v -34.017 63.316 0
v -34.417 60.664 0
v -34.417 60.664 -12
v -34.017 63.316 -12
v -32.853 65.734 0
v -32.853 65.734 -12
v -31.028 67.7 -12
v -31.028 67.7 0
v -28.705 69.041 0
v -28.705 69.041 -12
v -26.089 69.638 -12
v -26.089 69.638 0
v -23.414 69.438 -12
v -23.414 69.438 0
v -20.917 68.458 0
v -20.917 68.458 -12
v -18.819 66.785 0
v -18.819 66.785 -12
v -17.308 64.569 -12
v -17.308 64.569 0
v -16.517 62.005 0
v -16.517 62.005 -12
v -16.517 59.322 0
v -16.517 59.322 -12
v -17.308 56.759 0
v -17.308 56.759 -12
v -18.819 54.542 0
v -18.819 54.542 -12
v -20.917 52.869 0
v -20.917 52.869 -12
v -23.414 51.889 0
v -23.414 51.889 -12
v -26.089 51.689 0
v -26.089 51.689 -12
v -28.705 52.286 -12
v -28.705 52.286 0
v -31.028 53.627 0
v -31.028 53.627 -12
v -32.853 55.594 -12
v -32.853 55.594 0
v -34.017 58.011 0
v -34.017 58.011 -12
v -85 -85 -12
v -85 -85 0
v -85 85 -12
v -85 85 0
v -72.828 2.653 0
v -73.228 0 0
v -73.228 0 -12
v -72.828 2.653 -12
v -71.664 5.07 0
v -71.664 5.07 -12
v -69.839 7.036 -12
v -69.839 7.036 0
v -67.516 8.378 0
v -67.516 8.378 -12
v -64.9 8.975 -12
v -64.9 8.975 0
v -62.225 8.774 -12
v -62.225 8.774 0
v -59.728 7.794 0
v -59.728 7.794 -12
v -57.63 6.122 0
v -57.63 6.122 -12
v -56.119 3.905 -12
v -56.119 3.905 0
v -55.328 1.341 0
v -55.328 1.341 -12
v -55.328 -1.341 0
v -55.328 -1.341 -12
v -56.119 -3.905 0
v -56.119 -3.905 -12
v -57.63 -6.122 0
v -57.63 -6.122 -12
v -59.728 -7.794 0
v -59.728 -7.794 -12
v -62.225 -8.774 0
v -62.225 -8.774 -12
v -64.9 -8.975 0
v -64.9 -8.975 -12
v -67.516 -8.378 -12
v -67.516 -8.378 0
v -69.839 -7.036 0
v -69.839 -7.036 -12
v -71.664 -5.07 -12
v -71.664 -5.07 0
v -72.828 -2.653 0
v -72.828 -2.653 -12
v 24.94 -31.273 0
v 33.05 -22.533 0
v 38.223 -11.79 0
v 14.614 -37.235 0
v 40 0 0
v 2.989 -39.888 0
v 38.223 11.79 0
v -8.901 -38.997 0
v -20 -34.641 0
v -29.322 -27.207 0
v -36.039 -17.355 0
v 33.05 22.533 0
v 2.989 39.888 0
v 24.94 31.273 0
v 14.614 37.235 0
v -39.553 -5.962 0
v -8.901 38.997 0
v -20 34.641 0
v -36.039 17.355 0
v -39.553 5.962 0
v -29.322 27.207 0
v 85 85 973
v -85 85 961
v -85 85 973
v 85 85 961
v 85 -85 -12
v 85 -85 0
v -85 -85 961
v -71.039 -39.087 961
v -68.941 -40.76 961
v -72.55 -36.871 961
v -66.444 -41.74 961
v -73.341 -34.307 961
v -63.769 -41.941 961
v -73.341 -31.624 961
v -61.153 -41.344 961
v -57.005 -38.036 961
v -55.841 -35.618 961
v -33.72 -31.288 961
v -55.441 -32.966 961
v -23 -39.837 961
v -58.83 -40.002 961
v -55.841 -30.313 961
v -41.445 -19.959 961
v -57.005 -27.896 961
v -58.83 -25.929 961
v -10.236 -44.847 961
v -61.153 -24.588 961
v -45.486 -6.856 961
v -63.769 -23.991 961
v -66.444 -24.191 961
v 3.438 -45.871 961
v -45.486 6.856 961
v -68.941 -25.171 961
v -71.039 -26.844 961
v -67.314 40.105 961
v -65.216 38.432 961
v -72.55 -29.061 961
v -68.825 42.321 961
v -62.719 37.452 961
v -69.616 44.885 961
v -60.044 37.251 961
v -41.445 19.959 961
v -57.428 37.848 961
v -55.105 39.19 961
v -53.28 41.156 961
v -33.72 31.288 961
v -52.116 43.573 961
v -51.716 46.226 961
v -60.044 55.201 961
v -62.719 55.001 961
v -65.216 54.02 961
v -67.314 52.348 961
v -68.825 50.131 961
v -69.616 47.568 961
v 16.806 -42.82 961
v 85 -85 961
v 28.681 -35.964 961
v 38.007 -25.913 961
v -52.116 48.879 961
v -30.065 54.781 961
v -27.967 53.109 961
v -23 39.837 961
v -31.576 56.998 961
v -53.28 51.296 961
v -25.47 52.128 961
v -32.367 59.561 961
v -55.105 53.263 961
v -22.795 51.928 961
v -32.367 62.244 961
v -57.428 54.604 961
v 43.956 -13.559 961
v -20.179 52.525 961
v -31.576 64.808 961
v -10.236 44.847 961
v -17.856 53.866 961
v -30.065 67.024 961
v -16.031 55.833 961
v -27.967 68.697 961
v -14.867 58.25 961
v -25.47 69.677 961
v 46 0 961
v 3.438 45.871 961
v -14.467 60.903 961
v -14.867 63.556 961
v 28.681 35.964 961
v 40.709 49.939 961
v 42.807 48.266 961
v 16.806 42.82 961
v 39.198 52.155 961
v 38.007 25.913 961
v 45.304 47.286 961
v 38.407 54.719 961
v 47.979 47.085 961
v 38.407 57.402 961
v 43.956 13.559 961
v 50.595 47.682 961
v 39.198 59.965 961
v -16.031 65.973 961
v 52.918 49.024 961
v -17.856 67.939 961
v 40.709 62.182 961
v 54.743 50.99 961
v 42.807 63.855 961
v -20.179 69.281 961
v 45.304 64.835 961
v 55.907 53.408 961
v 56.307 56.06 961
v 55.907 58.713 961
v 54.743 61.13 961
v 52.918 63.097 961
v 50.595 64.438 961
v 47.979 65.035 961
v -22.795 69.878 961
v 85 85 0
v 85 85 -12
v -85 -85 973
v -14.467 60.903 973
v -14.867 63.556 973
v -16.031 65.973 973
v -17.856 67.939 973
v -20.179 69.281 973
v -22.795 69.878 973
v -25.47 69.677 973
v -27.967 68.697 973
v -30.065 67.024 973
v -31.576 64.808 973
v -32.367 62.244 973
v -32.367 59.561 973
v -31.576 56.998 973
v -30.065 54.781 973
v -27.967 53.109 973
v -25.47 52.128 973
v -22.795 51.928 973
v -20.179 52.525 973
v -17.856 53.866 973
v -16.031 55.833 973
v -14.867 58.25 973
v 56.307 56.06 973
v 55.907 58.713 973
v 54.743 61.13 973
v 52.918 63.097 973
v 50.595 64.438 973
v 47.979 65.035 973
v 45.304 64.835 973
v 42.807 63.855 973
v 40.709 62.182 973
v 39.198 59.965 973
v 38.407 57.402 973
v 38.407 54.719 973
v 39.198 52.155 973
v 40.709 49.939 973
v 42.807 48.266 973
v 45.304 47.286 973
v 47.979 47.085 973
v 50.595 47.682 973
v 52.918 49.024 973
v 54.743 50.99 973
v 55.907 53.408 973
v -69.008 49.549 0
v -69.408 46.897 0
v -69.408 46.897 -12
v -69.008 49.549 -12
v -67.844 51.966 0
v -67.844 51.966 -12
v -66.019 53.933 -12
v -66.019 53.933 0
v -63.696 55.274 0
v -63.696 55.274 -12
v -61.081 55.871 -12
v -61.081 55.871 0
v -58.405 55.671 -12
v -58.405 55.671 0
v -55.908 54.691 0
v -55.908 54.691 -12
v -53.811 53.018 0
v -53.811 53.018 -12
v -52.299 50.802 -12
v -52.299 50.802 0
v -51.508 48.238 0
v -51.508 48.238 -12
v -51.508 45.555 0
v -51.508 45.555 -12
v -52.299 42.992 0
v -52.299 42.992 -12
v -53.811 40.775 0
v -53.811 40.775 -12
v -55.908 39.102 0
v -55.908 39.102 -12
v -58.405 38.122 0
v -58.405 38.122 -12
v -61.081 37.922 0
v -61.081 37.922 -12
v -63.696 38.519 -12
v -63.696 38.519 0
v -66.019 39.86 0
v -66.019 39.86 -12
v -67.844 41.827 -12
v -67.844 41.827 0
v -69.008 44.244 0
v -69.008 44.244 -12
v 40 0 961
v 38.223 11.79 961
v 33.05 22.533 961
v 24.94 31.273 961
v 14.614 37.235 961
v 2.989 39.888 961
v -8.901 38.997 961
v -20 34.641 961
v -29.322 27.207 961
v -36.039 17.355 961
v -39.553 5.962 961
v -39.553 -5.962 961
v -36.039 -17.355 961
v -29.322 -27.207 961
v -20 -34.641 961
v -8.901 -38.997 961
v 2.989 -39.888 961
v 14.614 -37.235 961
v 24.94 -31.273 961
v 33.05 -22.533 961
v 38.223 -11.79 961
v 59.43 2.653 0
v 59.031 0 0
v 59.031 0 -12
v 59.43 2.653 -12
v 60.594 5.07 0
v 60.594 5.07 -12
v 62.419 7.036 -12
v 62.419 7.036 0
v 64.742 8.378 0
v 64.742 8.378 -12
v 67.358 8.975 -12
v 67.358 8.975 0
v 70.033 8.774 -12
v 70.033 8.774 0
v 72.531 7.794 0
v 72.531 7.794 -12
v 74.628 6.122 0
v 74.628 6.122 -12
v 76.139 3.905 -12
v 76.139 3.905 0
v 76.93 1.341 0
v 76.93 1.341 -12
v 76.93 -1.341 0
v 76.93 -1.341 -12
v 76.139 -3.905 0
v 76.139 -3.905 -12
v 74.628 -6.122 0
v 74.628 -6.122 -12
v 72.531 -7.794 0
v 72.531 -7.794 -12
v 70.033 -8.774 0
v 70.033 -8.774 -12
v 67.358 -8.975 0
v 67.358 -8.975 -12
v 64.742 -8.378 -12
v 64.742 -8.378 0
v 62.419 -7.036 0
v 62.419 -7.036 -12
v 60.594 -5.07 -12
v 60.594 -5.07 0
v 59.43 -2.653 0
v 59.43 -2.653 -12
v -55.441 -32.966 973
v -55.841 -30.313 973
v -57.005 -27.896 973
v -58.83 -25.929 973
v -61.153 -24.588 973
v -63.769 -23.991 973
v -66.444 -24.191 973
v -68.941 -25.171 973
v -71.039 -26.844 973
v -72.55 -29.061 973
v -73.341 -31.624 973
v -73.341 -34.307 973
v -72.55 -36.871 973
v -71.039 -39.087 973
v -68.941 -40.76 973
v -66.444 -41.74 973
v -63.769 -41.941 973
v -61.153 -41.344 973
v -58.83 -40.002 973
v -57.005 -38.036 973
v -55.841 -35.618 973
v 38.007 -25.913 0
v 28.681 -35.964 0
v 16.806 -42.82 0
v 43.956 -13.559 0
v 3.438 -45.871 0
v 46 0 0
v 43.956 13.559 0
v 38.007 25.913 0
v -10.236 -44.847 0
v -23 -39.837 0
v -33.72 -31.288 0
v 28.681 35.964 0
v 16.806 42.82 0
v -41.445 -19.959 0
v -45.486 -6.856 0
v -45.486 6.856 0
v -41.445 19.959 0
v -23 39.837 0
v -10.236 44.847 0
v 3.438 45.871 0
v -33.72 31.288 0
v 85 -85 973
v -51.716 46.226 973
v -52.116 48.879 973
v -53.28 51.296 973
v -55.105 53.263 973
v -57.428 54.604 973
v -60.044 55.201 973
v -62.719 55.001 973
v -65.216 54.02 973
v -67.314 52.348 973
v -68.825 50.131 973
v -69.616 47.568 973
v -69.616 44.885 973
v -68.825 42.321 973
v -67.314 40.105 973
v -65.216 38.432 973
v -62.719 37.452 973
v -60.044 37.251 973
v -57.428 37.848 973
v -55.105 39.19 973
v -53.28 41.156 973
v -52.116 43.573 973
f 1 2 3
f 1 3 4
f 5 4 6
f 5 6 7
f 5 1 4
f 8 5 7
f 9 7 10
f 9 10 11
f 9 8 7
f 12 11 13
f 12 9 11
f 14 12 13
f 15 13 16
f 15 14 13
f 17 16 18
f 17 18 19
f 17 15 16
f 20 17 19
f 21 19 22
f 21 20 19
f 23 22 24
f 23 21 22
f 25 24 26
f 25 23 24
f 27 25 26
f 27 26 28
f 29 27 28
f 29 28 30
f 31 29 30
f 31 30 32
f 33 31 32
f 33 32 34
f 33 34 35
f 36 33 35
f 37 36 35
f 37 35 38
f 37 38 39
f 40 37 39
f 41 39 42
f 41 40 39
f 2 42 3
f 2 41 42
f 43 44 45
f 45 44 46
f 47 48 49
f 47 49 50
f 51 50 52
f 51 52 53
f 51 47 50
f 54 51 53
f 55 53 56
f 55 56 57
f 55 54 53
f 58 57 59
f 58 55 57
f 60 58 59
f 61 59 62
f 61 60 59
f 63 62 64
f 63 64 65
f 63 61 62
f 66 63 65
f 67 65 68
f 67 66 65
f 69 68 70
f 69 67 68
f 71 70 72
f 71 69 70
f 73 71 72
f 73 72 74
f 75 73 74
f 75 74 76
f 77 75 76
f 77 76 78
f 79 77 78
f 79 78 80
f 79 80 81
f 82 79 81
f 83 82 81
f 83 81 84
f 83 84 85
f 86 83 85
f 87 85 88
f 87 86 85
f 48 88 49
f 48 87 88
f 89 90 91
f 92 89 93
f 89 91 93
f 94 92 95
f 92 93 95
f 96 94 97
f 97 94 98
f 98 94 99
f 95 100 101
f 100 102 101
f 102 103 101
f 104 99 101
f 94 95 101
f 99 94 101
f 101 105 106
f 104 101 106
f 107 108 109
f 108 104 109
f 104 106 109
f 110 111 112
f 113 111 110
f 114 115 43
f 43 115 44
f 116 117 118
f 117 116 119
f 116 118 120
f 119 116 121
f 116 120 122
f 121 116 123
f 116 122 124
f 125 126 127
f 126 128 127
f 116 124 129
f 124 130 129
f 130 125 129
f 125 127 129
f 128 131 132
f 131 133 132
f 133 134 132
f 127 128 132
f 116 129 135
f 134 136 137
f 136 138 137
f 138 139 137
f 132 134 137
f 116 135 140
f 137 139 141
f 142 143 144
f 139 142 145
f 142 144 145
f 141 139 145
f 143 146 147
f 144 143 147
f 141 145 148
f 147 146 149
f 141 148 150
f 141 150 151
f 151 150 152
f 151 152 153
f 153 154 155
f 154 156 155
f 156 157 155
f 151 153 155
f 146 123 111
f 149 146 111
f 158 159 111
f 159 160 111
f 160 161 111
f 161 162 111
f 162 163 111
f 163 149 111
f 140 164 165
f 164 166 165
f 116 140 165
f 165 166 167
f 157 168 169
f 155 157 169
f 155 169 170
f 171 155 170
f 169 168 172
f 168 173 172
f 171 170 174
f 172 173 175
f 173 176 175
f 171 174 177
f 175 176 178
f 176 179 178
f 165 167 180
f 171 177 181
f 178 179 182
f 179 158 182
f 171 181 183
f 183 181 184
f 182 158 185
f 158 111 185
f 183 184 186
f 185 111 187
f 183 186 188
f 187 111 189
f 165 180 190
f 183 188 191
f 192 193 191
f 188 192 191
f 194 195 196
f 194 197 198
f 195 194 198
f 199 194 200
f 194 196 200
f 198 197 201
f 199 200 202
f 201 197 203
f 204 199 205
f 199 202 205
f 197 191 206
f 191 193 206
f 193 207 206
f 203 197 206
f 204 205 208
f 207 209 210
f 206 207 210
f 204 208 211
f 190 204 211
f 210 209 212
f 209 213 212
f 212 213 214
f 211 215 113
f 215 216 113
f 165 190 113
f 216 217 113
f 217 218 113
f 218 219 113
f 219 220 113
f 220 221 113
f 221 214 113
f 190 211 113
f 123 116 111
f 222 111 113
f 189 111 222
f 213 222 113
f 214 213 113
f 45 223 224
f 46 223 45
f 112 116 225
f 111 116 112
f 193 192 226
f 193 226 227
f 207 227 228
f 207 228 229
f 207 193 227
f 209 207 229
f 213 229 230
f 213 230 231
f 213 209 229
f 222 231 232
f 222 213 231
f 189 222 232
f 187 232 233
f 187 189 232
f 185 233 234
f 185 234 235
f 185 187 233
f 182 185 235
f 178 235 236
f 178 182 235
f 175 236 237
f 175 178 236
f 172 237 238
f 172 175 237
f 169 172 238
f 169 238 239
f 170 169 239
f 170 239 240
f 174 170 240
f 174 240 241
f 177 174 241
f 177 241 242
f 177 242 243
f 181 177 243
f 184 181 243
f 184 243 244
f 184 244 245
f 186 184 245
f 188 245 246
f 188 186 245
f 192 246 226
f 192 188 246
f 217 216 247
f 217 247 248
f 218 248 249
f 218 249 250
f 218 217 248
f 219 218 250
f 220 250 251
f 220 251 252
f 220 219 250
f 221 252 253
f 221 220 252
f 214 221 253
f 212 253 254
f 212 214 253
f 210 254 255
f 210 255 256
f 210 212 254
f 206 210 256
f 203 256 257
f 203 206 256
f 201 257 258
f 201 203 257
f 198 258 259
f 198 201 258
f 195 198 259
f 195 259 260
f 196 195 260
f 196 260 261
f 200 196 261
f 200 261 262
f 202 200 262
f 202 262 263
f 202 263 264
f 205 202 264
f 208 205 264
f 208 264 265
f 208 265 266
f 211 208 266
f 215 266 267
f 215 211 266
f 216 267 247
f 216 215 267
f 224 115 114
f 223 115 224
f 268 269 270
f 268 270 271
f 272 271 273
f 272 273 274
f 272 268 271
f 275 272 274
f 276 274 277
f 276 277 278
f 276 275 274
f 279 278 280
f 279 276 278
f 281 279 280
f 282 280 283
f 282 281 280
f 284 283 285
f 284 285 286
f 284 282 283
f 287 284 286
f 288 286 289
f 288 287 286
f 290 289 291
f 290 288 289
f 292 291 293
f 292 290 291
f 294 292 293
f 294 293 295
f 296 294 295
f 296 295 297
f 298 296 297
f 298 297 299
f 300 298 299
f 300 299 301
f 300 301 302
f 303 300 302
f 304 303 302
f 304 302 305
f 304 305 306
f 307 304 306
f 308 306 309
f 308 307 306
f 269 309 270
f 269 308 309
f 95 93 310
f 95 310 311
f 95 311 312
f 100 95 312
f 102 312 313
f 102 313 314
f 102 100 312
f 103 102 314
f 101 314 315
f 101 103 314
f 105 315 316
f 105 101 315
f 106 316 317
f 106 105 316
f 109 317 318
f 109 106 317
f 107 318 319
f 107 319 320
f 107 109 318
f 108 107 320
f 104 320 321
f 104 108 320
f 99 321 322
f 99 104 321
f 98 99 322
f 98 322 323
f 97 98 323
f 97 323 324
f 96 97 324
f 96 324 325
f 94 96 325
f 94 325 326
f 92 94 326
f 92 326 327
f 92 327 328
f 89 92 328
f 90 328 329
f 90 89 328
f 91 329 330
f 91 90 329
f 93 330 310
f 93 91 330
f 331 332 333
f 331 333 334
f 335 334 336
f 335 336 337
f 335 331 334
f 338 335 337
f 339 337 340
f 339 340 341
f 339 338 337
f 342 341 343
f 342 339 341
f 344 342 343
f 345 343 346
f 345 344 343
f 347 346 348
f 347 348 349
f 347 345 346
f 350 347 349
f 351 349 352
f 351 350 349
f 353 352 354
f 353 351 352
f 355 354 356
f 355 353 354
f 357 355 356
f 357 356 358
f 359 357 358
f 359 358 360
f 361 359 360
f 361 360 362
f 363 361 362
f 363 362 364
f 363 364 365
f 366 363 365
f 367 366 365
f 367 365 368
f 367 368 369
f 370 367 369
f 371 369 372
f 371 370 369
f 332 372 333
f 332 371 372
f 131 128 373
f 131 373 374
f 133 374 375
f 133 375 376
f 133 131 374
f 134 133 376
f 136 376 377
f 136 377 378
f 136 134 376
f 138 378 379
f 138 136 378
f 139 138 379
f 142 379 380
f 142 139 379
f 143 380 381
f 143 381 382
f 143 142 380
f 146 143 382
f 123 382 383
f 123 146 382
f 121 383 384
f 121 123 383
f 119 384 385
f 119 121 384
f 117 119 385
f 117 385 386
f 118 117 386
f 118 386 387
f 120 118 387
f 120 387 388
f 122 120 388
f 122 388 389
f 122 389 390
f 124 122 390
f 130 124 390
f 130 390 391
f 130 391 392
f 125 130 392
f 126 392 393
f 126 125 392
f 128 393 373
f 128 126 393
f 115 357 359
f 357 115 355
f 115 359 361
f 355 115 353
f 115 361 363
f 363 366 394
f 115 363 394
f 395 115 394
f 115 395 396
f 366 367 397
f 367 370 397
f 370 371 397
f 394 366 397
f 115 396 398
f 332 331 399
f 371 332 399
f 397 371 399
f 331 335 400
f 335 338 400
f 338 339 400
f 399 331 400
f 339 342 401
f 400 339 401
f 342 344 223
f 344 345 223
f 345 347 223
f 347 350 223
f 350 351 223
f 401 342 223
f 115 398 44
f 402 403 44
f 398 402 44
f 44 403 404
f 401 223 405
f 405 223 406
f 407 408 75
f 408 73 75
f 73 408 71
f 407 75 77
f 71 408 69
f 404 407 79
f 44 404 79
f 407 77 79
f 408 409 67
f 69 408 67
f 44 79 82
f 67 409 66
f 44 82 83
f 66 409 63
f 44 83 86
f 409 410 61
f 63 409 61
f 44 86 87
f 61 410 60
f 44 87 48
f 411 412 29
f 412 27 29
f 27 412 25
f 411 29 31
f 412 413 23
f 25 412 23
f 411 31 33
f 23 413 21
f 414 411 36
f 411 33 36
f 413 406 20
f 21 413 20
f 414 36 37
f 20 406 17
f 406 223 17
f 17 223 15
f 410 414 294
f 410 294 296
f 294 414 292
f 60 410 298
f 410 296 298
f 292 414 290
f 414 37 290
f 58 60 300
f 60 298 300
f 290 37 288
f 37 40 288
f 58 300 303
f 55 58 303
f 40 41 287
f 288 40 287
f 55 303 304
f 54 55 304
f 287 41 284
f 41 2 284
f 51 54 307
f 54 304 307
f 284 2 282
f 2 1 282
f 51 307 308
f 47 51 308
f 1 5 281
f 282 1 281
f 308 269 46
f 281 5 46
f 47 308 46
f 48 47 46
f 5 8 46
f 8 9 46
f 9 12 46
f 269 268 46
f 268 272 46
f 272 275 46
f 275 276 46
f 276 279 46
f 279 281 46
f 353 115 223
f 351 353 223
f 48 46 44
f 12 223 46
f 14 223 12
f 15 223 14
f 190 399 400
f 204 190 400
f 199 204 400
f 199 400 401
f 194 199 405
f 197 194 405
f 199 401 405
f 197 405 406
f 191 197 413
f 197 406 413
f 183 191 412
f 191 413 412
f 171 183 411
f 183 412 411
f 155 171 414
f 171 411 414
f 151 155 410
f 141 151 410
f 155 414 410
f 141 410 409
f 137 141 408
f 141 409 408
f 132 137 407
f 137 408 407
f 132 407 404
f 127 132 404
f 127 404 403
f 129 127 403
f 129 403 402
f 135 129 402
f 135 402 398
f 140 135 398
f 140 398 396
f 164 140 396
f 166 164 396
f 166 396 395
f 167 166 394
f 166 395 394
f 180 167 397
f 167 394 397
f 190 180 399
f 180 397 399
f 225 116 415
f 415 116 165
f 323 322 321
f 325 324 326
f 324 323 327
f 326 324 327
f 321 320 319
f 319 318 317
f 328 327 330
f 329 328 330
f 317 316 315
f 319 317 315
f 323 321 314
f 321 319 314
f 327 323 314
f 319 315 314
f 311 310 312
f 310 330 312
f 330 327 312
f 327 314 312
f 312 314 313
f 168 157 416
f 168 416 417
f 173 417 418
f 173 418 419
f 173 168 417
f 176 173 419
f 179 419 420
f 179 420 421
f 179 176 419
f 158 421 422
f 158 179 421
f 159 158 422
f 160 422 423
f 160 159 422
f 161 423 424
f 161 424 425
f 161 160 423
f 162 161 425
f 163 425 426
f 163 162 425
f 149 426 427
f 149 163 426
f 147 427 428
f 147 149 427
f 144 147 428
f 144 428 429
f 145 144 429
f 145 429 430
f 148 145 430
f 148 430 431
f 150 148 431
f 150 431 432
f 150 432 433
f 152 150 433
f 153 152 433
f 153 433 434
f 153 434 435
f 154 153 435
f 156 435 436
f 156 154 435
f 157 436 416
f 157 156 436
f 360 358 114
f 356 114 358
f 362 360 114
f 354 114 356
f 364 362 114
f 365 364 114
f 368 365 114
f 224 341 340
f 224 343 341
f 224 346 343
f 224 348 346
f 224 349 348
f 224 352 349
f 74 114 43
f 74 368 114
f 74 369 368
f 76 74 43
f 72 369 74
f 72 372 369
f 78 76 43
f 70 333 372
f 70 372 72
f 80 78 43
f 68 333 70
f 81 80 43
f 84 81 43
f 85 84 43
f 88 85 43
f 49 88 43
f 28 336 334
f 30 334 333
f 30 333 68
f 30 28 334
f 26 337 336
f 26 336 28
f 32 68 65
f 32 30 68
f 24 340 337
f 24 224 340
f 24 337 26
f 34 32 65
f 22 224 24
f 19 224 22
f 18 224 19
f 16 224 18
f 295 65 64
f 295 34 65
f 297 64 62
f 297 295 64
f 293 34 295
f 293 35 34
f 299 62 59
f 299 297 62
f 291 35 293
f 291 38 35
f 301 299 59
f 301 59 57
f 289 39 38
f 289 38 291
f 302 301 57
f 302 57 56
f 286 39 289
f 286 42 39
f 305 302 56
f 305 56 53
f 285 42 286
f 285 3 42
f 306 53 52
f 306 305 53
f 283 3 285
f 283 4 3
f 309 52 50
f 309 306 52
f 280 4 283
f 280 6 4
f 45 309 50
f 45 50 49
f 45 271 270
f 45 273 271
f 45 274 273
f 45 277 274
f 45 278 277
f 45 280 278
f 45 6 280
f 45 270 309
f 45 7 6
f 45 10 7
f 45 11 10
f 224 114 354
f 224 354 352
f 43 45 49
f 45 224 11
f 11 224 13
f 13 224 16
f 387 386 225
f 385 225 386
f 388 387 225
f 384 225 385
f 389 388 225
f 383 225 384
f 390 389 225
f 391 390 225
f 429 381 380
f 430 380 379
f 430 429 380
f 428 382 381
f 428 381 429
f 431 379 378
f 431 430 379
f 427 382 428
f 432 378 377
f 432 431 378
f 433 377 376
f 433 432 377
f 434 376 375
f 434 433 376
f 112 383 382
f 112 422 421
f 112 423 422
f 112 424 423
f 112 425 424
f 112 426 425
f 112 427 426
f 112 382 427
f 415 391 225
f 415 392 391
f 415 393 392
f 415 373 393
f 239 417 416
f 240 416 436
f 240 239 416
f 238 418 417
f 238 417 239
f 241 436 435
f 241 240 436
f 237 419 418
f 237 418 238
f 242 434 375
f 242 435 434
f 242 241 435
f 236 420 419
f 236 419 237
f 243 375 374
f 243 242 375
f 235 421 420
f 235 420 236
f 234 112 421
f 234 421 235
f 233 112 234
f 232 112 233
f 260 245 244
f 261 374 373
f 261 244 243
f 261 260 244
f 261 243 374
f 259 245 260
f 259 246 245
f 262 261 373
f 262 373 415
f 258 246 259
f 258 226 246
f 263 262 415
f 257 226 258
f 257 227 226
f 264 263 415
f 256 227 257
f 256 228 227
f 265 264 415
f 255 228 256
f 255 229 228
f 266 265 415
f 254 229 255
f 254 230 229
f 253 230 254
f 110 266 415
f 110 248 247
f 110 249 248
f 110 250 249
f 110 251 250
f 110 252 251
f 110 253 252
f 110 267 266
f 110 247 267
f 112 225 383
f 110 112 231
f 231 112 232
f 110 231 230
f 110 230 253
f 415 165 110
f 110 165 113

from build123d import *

# Parameters (mm, degrees)
SKETCH1_R           = 46
SKETCH1_R_2         = 40
BOSS_EXTRUDE1_DEPTH = 961
SKETCH2_W           = 170
SKETCH2_H           = 170
SKETCH2_R           = 9
BOSS_EXTRUDE2_DEPTH = 12
SKETCH3_W           = 170
SKETCH3_H           = 170
SKETCH3_R           = 9
BOSS_EXTRUDE3_DEPTH = 12


with BuildPart() as part:
    # Sketch1 → Boss-Extrude1 (new body)
    with BuildSketch(Plane.XY):
        Circle(SKETCH1_R)
        Circle(SKETCH1_R_2, mode=Mode.SUBTRACT)
    extrude(amount=BOSS_EXTRUDE1_DEPTH)

    # Sketch2 → Boss-Extrude2 (add)
    with BuildSketch(Plane(origin=(0, 0, 0), x_dir=(-1, 0, 0), z_dir=(0, 0, -1))):
        Rectangle(SKETCH2_W, SKETCH2_H)
        with Locations((64.227589169, 0)):
            Circle(SKETCH2_R, mode=Mode.SUBTRACT)
        with Locations((-68.030538528, 0)):
            Circle(SKETCH2_R, mode=Mode.SUBTRACT)
        with Locations((60.407969797, 46.896616819)):
            Circle(SKETCH2_R, mode=Mode.SUBTRACT)
        with Locations((25.416815813, 60.663628222)):
            Circle(SKETCH2_R, mode=Mode.SUBTRACT)
    extrude(amount=BOSS_EXTRUDE2_DEPTH)

    # Sketch3 → Boss-Extrude3 (add)
    with BuildSketch(Plane.XY.offset(961)):
        Rectangle(SKETCH3_W, SKETCH3_H)
        with Locations((47.306709653, 56.060313407)):
            Circle(SKETCH3_R, mode=Mode.SUBTRACT)
        with Locations((-23.467107938, 60.902732505)):
            Circle(SKETCH3_R, mode=Mode.SUBTRACT)
        with Locations((-60.716485617, 46.226195512)):
            Circle(SKETCH3_R, mode=Mode.SUBTRACT)
        with Locations((-64.441423385, -32.965699246)):
            Circle(SKETCH3_R, mode=Mode.SUBTRACT)
    extrude(amount=BOSS_EXTRUDE3_DEPTH)


solid = part.part
